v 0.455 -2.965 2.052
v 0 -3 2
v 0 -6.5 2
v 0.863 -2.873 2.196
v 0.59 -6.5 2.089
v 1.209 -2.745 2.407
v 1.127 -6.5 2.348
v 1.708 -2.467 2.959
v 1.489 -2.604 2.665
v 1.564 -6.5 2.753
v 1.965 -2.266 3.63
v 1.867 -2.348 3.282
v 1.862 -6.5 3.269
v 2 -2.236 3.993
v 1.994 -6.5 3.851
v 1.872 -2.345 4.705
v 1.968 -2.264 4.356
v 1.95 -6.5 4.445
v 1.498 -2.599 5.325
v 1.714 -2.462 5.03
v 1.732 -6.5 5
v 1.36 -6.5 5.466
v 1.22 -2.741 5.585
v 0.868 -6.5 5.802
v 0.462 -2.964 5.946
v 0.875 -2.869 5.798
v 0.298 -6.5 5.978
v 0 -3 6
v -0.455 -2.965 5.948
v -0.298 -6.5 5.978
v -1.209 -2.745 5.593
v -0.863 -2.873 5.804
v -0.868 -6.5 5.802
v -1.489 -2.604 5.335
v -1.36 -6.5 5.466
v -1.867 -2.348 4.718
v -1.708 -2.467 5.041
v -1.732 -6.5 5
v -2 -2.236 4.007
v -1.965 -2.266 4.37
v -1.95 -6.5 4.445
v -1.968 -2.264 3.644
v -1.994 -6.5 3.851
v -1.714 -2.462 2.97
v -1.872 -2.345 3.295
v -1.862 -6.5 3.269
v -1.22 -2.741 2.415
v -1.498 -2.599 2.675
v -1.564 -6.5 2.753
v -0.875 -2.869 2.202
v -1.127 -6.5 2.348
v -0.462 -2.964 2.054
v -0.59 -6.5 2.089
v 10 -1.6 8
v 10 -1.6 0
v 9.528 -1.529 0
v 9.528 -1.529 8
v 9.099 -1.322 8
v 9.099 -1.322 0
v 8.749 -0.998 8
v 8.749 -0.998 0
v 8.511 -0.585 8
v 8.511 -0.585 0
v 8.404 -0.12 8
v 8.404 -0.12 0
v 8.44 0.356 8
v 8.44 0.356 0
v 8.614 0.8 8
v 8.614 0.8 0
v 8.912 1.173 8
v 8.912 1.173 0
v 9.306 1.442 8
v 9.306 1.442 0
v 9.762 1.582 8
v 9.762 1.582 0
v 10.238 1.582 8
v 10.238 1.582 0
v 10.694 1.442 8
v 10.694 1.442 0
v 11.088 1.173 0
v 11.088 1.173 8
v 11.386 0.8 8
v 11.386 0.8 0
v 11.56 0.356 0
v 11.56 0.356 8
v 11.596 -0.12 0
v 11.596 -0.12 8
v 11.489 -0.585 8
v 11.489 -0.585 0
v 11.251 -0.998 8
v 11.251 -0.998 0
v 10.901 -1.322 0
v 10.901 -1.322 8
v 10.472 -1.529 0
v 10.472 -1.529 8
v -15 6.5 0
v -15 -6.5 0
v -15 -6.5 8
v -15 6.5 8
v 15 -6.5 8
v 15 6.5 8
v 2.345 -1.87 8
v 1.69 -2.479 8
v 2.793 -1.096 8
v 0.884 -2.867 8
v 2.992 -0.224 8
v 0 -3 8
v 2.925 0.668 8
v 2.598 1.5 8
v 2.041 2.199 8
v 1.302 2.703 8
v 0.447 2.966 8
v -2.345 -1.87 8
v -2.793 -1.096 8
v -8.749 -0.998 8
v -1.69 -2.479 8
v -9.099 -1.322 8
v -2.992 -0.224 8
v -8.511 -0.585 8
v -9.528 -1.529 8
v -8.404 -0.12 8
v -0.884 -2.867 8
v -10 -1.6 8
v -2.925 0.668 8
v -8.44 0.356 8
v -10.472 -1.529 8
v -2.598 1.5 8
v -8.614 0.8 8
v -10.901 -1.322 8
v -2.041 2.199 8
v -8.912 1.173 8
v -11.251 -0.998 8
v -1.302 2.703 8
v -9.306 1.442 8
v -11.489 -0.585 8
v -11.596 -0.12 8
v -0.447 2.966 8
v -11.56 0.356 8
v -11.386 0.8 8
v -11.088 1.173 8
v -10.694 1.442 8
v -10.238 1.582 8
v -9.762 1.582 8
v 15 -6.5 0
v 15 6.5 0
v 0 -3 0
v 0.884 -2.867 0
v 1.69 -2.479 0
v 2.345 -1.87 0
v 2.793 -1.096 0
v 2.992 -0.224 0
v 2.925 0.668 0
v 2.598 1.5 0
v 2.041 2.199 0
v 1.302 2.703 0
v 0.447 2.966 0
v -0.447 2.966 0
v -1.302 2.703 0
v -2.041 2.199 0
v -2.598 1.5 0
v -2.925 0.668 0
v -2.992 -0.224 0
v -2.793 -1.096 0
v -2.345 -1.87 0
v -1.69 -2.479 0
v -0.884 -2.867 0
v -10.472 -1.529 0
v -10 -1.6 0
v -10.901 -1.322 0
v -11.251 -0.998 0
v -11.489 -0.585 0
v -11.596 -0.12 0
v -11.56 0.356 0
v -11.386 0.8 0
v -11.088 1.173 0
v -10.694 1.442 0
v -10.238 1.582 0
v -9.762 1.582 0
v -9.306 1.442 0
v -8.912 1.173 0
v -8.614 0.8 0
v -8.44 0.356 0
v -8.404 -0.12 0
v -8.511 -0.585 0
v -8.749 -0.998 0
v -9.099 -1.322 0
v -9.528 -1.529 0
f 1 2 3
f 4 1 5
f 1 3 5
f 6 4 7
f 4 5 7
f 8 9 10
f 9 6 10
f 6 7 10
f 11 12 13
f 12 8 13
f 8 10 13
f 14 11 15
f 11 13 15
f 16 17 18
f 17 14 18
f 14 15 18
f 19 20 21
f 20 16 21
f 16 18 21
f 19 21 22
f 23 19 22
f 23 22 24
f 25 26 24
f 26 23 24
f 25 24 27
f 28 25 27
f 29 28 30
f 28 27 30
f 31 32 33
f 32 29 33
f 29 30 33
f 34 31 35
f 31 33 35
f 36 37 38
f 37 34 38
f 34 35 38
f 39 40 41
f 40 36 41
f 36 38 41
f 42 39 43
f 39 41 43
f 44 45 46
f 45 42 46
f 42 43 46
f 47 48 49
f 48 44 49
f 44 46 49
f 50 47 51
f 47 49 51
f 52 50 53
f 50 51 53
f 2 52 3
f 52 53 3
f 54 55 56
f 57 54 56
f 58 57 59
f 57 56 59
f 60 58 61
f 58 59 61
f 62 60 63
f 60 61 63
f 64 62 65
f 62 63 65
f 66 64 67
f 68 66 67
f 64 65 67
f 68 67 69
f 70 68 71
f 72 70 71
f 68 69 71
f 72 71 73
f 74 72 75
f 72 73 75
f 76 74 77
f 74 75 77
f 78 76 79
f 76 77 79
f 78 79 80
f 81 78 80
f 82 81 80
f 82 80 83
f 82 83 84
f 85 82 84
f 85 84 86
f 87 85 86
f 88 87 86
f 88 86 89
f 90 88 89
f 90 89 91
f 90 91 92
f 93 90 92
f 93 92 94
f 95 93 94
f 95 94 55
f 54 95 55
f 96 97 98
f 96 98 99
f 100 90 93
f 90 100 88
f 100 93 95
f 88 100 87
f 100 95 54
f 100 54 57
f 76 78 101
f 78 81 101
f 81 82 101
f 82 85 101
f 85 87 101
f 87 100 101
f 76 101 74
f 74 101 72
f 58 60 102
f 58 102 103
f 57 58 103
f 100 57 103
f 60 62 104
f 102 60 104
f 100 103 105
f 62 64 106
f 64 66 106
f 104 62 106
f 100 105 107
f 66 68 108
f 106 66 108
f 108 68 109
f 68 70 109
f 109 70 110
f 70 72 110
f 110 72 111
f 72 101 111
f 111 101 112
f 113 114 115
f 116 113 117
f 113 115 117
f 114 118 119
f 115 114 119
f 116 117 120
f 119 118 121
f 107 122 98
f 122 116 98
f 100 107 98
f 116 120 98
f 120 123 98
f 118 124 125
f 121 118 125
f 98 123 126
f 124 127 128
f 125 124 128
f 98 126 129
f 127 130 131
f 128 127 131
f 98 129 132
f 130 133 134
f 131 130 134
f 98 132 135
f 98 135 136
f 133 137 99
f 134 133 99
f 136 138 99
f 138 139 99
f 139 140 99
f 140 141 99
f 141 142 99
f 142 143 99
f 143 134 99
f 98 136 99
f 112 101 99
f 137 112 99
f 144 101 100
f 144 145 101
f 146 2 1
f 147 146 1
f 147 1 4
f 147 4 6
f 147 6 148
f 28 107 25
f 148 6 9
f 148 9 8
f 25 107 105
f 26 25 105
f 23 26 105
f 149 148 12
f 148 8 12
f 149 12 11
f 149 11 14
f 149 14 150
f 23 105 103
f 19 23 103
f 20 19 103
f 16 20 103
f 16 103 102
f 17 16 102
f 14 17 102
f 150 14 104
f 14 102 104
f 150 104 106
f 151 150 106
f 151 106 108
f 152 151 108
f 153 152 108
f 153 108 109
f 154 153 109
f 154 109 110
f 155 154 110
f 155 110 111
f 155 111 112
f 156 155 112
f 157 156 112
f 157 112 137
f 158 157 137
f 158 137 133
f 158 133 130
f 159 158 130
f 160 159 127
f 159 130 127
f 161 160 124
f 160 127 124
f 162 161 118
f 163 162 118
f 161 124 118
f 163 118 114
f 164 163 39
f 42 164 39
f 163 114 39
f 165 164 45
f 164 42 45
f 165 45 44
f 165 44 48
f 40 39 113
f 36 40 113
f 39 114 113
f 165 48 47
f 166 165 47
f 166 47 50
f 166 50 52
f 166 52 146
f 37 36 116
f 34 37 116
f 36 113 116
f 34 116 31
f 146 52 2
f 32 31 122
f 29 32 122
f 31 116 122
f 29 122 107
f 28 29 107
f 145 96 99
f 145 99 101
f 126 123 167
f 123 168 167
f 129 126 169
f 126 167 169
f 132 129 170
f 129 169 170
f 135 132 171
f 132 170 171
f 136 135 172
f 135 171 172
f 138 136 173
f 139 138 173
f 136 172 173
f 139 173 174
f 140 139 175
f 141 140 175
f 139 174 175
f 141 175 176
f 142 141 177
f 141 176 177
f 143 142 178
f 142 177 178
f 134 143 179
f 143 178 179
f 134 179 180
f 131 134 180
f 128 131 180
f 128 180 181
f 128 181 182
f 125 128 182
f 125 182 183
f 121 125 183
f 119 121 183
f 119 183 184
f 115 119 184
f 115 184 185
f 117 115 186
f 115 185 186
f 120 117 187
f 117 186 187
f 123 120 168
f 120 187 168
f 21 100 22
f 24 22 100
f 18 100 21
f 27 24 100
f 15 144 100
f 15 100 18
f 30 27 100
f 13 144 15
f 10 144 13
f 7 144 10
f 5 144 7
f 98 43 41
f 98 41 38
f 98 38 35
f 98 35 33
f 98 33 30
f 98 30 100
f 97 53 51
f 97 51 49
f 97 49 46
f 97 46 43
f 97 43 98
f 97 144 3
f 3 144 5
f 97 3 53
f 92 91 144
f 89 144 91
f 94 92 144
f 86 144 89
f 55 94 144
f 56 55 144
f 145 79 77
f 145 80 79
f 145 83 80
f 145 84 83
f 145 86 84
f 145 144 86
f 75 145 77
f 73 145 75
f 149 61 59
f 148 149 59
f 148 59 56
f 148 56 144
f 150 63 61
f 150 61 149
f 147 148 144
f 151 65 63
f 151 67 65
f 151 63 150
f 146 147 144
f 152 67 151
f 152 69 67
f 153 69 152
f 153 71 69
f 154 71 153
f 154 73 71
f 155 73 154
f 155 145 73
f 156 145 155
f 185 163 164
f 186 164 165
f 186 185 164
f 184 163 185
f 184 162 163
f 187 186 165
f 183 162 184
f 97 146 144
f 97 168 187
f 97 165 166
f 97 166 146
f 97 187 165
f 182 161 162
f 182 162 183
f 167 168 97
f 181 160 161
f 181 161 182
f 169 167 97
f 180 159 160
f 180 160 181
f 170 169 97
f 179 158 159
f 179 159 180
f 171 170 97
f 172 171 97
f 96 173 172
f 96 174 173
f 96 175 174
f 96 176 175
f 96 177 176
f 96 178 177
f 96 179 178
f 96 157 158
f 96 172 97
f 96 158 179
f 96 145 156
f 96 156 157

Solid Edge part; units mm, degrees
sketch "Sketch1" plane through (0, 0, 0) normal (0, 0, 1) x (1, 0, 0)
  line L0 (15, -6.5) -> (-15, -6.5)
  line L1 (-15, -6.5) -> (-15, 6.5)
  line L2 (-15, 6.5) -> (15, 6.5)
  line L3 (15, 6.5) -> (15, -6.5)
  dimension "D1" = 30
  dimension "D2" = 13
extrude "Protrusion1" add sketch "Sketch1" along normal blind 8
hole "Hole_1" at (0, 0, 8) direction (0, 0, -1) diameter 6 end through all
hole "Hole_2" at (0, -6.5, 4) direction (0, 1, 0) diameter 4 end up to next
hole "Hole_3" at (-10, 0, 8) direction (0, 0, -1) diameter 3.2 depth 140
hole "Hole1" at (10, 0, 8) direction (0, 0, -1) diameter 3.2 depth 140
